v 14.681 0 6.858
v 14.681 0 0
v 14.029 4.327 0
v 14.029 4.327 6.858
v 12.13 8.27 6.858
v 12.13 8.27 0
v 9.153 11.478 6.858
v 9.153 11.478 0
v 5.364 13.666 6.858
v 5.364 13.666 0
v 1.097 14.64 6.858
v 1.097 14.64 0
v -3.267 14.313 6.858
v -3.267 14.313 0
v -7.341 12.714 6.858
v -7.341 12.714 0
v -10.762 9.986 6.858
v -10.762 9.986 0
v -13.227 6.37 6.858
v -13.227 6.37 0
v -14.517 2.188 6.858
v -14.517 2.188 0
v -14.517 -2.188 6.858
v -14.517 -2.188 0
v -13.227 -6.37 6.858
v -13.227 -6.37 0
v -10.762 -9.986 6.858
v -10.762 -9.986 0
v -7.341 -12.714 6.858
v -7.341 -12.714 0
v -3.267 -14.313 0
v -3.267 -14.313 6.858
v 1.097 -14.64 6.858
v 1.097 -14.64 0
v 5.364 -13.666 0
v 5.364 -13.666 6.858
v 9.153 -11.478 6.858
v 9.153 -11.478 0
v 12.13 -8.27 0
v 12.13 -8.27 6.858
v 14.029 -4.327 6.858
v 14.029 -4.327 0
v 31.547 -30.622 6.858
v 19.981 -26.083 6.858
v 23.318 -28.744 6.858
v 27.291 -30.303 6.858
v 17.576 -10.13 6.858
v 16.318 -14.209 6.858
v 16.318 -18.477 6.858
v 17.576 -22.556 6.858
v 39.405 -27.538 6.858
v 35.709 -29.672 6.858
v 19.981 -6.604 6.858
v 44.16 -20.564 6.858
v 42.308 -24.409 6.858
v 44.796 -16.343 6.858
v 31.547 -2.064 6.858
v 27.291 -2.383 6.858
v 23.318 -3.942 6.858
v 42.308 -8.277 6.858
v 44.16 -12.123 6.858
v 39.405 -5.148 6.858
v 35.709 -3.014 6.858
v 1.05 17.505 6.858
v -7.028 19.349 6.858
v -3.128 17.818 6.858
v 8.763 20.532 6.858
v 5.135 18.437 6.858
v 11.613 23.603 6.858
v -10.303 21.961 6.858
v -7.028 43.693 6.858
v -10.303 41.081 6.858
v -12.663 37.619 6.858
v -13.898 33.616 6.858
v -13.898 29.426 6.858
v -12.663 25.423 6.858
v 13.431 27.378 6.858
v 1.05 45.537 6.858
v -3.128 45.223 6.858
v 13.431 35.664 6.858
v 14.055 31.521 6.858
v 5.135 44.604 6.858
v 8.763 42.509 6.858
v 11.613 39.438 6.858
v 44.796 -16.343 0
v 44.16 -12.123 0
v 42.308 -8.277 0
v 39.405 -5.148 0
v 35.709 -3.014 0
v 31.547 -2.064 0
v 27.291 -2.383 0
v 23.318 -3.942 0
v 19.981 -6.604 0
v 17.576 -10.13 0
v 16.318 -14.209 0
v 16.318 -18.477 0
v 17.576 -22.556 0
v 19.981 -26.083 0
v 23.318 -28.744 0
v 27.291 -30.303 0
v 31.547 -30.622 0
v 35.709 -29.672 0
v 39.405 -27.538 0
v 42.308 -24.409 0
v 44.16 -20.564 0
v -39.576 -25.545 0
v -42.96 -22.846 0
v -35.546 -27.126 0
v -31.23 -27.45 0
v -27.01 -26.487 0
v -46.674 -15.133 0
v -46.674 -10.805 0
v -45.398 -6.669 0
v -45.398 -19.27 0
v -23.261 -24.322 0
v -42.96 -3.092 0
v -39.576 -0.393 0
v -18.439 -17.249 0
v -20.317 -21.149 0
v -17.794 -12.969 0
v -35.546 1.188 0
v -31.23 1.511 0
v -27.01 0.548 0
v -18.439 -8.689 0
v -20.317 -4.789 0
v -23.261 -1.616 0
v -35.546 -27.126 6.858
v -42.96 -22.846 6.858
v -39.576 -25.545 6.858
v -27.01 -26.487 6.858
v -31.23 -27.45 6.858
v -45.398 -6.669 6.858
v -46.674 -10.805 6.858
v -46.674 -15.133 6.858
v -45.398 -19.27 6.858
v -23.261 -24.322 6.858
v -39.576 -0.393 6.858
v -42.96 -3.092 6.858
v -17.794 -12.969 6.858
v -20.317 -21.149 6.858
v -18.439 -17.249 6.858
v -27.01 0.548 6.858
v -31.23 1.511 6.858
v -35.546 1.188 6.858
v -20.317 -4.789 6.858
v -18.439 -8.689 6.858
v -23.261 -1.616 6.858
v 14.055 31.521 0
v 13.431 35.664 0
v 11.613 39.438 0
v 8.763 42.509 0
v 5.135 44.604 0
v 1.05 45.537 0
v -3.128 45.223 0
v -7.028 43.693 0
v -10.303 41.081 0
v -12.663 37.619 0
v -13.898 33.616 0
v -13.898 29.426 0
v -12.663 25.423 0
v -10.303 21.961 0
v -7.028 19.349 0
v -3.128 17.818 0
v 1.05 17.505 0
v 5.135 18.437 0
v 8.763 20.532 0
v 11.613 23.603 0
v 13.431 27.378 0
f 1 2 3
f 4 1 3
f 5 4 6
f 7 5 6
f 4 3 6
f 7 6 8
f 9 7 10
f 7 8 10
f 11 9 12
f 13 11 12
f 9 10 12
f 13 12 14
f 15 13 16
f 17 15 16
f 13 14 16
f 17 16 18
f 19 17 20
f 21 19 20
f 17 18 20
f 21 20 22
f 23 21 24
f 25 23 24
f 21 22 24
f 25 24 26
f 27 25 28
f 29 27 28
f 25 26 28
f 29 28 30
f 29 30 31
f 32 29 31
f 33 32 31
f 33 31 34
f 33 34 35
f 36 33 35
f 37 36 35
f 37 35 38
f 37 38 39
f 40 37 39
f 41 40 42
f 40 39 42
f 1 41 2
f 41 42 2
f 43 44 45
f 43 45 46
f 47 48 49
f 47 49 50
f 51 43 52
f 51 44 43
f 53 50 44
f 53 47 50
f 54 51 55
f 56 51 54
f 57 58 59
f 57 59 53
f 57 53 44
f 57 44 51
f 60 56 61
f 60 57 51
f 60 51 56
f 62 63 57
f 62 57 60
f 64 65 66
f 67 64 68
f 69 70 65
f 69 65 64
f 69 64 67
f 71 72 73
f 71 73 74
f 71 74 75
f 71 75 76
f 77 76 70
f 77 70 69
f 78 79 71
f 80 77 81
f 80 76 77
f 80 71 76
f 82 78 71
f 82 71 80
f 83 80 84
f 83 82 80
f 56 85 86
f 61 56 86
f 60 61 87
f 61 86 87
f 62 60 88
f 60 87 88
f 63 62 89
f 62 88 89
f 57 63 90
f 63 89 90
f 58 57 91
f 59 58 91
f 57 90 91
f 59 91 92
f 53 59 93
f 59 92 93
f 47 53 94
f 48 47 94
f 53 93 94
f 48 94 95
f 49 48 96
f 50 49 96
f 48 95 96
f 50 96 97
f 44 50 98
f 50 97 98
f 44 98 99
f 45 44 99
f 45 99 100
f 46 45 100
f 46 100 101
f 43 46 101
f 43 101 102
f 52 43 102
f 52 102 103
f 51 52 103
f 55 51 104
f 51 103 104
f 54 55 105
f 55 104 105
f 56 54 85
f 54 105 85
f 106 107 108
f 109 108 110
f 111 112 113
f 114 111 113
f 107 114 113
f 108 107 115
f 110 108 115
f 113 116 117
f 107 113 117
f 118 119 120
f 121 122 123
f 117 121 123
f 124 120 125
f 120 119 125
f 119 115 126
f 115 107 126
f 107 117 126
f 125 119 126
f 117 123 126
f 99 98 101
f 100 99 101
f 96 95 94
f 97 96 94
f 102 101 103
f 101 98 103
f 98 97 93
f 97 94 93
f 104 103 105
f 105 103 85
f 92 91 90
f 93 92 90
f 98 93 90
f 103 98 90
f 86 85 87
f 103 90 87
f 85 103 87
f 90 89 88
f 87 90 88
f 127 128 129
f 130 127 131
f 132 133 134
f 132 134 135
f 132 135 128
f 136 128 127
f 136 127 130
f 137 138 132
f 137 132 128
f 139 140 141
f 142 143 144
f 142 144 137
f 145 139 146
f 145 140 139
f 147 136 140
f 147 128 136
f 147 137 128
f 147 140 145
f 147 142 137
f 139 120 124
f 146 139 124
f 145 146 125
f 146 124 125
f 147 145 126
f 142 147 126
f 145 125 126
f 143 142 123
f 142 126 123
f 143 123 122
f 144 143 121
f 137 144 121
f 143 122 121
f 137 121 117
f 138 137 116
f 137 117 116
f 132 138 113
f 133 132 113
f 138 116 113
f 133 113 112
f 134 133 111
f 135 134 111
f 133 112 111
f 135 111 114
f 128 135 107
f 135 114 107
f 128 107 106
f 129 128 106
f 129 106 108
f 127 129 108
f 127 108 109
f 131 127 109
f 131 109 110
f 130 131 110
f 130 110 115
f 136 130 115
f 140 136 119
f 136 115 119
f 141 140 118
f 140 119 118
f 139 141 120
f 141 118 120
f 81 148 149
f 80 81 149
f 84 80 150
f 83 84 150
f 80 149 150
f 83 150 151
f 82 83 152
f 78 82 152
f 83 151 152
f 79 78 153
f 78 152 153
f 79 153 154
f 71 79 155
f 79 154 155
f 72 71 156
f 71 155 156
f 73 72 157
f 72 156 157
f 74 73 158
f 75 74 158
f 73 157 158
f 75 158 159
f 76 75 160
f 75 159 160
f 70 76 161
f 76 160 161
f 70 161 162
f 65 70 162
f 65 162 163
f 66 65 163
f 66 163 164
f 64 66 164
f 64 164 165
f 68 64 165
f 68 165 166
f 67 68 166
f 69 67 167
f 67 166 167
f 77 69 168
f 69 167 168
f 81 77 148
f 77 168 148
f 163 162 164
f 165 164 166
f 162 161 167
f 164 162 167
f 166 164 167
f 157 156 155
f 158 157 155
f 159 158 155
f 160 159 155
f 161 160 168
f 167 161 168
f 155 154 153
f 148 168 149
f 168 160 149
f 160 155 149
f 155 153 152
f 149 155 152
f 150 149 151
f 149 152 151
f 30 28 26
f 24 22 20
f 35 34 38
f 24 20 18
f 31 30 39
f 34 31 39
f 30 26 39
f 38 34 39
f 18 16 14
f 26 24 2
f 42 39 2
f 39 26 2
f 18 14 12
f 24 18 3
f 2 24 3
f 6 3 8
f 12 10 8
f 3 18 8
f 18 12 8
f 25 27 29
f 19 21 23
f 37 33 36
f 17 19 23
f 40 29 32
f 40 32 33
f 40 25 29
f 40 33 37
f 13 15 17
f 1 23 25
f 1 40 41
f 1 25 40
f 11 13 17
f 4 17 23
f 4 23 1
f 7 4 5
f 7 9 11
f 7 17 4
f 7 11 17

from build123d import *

# Parameters (mm, degrees)
F0_R     = 14.31906
F0_R_2   = 14.681001
F0_R_3   = 14.055033
F0_R_4   = 14.521232
F1_DEPTH = 6.858


with BuildPart() as f1:
    # F0 (on Top) → F1 (new body)
    with BuildSketch(Plane.XY):
        with Locations((30.477403, -16.343122)):
            Circle(F0_R)
        Circle(F0_R_2)
        with Locations((0, 31.520817)):
            Circle(F0_R_3)
        with Locations((-32.314926, -12.96921)):
            Circle(F0_R_4)
    extrude(amount=F1_DEPTH)


solid = f1.part
